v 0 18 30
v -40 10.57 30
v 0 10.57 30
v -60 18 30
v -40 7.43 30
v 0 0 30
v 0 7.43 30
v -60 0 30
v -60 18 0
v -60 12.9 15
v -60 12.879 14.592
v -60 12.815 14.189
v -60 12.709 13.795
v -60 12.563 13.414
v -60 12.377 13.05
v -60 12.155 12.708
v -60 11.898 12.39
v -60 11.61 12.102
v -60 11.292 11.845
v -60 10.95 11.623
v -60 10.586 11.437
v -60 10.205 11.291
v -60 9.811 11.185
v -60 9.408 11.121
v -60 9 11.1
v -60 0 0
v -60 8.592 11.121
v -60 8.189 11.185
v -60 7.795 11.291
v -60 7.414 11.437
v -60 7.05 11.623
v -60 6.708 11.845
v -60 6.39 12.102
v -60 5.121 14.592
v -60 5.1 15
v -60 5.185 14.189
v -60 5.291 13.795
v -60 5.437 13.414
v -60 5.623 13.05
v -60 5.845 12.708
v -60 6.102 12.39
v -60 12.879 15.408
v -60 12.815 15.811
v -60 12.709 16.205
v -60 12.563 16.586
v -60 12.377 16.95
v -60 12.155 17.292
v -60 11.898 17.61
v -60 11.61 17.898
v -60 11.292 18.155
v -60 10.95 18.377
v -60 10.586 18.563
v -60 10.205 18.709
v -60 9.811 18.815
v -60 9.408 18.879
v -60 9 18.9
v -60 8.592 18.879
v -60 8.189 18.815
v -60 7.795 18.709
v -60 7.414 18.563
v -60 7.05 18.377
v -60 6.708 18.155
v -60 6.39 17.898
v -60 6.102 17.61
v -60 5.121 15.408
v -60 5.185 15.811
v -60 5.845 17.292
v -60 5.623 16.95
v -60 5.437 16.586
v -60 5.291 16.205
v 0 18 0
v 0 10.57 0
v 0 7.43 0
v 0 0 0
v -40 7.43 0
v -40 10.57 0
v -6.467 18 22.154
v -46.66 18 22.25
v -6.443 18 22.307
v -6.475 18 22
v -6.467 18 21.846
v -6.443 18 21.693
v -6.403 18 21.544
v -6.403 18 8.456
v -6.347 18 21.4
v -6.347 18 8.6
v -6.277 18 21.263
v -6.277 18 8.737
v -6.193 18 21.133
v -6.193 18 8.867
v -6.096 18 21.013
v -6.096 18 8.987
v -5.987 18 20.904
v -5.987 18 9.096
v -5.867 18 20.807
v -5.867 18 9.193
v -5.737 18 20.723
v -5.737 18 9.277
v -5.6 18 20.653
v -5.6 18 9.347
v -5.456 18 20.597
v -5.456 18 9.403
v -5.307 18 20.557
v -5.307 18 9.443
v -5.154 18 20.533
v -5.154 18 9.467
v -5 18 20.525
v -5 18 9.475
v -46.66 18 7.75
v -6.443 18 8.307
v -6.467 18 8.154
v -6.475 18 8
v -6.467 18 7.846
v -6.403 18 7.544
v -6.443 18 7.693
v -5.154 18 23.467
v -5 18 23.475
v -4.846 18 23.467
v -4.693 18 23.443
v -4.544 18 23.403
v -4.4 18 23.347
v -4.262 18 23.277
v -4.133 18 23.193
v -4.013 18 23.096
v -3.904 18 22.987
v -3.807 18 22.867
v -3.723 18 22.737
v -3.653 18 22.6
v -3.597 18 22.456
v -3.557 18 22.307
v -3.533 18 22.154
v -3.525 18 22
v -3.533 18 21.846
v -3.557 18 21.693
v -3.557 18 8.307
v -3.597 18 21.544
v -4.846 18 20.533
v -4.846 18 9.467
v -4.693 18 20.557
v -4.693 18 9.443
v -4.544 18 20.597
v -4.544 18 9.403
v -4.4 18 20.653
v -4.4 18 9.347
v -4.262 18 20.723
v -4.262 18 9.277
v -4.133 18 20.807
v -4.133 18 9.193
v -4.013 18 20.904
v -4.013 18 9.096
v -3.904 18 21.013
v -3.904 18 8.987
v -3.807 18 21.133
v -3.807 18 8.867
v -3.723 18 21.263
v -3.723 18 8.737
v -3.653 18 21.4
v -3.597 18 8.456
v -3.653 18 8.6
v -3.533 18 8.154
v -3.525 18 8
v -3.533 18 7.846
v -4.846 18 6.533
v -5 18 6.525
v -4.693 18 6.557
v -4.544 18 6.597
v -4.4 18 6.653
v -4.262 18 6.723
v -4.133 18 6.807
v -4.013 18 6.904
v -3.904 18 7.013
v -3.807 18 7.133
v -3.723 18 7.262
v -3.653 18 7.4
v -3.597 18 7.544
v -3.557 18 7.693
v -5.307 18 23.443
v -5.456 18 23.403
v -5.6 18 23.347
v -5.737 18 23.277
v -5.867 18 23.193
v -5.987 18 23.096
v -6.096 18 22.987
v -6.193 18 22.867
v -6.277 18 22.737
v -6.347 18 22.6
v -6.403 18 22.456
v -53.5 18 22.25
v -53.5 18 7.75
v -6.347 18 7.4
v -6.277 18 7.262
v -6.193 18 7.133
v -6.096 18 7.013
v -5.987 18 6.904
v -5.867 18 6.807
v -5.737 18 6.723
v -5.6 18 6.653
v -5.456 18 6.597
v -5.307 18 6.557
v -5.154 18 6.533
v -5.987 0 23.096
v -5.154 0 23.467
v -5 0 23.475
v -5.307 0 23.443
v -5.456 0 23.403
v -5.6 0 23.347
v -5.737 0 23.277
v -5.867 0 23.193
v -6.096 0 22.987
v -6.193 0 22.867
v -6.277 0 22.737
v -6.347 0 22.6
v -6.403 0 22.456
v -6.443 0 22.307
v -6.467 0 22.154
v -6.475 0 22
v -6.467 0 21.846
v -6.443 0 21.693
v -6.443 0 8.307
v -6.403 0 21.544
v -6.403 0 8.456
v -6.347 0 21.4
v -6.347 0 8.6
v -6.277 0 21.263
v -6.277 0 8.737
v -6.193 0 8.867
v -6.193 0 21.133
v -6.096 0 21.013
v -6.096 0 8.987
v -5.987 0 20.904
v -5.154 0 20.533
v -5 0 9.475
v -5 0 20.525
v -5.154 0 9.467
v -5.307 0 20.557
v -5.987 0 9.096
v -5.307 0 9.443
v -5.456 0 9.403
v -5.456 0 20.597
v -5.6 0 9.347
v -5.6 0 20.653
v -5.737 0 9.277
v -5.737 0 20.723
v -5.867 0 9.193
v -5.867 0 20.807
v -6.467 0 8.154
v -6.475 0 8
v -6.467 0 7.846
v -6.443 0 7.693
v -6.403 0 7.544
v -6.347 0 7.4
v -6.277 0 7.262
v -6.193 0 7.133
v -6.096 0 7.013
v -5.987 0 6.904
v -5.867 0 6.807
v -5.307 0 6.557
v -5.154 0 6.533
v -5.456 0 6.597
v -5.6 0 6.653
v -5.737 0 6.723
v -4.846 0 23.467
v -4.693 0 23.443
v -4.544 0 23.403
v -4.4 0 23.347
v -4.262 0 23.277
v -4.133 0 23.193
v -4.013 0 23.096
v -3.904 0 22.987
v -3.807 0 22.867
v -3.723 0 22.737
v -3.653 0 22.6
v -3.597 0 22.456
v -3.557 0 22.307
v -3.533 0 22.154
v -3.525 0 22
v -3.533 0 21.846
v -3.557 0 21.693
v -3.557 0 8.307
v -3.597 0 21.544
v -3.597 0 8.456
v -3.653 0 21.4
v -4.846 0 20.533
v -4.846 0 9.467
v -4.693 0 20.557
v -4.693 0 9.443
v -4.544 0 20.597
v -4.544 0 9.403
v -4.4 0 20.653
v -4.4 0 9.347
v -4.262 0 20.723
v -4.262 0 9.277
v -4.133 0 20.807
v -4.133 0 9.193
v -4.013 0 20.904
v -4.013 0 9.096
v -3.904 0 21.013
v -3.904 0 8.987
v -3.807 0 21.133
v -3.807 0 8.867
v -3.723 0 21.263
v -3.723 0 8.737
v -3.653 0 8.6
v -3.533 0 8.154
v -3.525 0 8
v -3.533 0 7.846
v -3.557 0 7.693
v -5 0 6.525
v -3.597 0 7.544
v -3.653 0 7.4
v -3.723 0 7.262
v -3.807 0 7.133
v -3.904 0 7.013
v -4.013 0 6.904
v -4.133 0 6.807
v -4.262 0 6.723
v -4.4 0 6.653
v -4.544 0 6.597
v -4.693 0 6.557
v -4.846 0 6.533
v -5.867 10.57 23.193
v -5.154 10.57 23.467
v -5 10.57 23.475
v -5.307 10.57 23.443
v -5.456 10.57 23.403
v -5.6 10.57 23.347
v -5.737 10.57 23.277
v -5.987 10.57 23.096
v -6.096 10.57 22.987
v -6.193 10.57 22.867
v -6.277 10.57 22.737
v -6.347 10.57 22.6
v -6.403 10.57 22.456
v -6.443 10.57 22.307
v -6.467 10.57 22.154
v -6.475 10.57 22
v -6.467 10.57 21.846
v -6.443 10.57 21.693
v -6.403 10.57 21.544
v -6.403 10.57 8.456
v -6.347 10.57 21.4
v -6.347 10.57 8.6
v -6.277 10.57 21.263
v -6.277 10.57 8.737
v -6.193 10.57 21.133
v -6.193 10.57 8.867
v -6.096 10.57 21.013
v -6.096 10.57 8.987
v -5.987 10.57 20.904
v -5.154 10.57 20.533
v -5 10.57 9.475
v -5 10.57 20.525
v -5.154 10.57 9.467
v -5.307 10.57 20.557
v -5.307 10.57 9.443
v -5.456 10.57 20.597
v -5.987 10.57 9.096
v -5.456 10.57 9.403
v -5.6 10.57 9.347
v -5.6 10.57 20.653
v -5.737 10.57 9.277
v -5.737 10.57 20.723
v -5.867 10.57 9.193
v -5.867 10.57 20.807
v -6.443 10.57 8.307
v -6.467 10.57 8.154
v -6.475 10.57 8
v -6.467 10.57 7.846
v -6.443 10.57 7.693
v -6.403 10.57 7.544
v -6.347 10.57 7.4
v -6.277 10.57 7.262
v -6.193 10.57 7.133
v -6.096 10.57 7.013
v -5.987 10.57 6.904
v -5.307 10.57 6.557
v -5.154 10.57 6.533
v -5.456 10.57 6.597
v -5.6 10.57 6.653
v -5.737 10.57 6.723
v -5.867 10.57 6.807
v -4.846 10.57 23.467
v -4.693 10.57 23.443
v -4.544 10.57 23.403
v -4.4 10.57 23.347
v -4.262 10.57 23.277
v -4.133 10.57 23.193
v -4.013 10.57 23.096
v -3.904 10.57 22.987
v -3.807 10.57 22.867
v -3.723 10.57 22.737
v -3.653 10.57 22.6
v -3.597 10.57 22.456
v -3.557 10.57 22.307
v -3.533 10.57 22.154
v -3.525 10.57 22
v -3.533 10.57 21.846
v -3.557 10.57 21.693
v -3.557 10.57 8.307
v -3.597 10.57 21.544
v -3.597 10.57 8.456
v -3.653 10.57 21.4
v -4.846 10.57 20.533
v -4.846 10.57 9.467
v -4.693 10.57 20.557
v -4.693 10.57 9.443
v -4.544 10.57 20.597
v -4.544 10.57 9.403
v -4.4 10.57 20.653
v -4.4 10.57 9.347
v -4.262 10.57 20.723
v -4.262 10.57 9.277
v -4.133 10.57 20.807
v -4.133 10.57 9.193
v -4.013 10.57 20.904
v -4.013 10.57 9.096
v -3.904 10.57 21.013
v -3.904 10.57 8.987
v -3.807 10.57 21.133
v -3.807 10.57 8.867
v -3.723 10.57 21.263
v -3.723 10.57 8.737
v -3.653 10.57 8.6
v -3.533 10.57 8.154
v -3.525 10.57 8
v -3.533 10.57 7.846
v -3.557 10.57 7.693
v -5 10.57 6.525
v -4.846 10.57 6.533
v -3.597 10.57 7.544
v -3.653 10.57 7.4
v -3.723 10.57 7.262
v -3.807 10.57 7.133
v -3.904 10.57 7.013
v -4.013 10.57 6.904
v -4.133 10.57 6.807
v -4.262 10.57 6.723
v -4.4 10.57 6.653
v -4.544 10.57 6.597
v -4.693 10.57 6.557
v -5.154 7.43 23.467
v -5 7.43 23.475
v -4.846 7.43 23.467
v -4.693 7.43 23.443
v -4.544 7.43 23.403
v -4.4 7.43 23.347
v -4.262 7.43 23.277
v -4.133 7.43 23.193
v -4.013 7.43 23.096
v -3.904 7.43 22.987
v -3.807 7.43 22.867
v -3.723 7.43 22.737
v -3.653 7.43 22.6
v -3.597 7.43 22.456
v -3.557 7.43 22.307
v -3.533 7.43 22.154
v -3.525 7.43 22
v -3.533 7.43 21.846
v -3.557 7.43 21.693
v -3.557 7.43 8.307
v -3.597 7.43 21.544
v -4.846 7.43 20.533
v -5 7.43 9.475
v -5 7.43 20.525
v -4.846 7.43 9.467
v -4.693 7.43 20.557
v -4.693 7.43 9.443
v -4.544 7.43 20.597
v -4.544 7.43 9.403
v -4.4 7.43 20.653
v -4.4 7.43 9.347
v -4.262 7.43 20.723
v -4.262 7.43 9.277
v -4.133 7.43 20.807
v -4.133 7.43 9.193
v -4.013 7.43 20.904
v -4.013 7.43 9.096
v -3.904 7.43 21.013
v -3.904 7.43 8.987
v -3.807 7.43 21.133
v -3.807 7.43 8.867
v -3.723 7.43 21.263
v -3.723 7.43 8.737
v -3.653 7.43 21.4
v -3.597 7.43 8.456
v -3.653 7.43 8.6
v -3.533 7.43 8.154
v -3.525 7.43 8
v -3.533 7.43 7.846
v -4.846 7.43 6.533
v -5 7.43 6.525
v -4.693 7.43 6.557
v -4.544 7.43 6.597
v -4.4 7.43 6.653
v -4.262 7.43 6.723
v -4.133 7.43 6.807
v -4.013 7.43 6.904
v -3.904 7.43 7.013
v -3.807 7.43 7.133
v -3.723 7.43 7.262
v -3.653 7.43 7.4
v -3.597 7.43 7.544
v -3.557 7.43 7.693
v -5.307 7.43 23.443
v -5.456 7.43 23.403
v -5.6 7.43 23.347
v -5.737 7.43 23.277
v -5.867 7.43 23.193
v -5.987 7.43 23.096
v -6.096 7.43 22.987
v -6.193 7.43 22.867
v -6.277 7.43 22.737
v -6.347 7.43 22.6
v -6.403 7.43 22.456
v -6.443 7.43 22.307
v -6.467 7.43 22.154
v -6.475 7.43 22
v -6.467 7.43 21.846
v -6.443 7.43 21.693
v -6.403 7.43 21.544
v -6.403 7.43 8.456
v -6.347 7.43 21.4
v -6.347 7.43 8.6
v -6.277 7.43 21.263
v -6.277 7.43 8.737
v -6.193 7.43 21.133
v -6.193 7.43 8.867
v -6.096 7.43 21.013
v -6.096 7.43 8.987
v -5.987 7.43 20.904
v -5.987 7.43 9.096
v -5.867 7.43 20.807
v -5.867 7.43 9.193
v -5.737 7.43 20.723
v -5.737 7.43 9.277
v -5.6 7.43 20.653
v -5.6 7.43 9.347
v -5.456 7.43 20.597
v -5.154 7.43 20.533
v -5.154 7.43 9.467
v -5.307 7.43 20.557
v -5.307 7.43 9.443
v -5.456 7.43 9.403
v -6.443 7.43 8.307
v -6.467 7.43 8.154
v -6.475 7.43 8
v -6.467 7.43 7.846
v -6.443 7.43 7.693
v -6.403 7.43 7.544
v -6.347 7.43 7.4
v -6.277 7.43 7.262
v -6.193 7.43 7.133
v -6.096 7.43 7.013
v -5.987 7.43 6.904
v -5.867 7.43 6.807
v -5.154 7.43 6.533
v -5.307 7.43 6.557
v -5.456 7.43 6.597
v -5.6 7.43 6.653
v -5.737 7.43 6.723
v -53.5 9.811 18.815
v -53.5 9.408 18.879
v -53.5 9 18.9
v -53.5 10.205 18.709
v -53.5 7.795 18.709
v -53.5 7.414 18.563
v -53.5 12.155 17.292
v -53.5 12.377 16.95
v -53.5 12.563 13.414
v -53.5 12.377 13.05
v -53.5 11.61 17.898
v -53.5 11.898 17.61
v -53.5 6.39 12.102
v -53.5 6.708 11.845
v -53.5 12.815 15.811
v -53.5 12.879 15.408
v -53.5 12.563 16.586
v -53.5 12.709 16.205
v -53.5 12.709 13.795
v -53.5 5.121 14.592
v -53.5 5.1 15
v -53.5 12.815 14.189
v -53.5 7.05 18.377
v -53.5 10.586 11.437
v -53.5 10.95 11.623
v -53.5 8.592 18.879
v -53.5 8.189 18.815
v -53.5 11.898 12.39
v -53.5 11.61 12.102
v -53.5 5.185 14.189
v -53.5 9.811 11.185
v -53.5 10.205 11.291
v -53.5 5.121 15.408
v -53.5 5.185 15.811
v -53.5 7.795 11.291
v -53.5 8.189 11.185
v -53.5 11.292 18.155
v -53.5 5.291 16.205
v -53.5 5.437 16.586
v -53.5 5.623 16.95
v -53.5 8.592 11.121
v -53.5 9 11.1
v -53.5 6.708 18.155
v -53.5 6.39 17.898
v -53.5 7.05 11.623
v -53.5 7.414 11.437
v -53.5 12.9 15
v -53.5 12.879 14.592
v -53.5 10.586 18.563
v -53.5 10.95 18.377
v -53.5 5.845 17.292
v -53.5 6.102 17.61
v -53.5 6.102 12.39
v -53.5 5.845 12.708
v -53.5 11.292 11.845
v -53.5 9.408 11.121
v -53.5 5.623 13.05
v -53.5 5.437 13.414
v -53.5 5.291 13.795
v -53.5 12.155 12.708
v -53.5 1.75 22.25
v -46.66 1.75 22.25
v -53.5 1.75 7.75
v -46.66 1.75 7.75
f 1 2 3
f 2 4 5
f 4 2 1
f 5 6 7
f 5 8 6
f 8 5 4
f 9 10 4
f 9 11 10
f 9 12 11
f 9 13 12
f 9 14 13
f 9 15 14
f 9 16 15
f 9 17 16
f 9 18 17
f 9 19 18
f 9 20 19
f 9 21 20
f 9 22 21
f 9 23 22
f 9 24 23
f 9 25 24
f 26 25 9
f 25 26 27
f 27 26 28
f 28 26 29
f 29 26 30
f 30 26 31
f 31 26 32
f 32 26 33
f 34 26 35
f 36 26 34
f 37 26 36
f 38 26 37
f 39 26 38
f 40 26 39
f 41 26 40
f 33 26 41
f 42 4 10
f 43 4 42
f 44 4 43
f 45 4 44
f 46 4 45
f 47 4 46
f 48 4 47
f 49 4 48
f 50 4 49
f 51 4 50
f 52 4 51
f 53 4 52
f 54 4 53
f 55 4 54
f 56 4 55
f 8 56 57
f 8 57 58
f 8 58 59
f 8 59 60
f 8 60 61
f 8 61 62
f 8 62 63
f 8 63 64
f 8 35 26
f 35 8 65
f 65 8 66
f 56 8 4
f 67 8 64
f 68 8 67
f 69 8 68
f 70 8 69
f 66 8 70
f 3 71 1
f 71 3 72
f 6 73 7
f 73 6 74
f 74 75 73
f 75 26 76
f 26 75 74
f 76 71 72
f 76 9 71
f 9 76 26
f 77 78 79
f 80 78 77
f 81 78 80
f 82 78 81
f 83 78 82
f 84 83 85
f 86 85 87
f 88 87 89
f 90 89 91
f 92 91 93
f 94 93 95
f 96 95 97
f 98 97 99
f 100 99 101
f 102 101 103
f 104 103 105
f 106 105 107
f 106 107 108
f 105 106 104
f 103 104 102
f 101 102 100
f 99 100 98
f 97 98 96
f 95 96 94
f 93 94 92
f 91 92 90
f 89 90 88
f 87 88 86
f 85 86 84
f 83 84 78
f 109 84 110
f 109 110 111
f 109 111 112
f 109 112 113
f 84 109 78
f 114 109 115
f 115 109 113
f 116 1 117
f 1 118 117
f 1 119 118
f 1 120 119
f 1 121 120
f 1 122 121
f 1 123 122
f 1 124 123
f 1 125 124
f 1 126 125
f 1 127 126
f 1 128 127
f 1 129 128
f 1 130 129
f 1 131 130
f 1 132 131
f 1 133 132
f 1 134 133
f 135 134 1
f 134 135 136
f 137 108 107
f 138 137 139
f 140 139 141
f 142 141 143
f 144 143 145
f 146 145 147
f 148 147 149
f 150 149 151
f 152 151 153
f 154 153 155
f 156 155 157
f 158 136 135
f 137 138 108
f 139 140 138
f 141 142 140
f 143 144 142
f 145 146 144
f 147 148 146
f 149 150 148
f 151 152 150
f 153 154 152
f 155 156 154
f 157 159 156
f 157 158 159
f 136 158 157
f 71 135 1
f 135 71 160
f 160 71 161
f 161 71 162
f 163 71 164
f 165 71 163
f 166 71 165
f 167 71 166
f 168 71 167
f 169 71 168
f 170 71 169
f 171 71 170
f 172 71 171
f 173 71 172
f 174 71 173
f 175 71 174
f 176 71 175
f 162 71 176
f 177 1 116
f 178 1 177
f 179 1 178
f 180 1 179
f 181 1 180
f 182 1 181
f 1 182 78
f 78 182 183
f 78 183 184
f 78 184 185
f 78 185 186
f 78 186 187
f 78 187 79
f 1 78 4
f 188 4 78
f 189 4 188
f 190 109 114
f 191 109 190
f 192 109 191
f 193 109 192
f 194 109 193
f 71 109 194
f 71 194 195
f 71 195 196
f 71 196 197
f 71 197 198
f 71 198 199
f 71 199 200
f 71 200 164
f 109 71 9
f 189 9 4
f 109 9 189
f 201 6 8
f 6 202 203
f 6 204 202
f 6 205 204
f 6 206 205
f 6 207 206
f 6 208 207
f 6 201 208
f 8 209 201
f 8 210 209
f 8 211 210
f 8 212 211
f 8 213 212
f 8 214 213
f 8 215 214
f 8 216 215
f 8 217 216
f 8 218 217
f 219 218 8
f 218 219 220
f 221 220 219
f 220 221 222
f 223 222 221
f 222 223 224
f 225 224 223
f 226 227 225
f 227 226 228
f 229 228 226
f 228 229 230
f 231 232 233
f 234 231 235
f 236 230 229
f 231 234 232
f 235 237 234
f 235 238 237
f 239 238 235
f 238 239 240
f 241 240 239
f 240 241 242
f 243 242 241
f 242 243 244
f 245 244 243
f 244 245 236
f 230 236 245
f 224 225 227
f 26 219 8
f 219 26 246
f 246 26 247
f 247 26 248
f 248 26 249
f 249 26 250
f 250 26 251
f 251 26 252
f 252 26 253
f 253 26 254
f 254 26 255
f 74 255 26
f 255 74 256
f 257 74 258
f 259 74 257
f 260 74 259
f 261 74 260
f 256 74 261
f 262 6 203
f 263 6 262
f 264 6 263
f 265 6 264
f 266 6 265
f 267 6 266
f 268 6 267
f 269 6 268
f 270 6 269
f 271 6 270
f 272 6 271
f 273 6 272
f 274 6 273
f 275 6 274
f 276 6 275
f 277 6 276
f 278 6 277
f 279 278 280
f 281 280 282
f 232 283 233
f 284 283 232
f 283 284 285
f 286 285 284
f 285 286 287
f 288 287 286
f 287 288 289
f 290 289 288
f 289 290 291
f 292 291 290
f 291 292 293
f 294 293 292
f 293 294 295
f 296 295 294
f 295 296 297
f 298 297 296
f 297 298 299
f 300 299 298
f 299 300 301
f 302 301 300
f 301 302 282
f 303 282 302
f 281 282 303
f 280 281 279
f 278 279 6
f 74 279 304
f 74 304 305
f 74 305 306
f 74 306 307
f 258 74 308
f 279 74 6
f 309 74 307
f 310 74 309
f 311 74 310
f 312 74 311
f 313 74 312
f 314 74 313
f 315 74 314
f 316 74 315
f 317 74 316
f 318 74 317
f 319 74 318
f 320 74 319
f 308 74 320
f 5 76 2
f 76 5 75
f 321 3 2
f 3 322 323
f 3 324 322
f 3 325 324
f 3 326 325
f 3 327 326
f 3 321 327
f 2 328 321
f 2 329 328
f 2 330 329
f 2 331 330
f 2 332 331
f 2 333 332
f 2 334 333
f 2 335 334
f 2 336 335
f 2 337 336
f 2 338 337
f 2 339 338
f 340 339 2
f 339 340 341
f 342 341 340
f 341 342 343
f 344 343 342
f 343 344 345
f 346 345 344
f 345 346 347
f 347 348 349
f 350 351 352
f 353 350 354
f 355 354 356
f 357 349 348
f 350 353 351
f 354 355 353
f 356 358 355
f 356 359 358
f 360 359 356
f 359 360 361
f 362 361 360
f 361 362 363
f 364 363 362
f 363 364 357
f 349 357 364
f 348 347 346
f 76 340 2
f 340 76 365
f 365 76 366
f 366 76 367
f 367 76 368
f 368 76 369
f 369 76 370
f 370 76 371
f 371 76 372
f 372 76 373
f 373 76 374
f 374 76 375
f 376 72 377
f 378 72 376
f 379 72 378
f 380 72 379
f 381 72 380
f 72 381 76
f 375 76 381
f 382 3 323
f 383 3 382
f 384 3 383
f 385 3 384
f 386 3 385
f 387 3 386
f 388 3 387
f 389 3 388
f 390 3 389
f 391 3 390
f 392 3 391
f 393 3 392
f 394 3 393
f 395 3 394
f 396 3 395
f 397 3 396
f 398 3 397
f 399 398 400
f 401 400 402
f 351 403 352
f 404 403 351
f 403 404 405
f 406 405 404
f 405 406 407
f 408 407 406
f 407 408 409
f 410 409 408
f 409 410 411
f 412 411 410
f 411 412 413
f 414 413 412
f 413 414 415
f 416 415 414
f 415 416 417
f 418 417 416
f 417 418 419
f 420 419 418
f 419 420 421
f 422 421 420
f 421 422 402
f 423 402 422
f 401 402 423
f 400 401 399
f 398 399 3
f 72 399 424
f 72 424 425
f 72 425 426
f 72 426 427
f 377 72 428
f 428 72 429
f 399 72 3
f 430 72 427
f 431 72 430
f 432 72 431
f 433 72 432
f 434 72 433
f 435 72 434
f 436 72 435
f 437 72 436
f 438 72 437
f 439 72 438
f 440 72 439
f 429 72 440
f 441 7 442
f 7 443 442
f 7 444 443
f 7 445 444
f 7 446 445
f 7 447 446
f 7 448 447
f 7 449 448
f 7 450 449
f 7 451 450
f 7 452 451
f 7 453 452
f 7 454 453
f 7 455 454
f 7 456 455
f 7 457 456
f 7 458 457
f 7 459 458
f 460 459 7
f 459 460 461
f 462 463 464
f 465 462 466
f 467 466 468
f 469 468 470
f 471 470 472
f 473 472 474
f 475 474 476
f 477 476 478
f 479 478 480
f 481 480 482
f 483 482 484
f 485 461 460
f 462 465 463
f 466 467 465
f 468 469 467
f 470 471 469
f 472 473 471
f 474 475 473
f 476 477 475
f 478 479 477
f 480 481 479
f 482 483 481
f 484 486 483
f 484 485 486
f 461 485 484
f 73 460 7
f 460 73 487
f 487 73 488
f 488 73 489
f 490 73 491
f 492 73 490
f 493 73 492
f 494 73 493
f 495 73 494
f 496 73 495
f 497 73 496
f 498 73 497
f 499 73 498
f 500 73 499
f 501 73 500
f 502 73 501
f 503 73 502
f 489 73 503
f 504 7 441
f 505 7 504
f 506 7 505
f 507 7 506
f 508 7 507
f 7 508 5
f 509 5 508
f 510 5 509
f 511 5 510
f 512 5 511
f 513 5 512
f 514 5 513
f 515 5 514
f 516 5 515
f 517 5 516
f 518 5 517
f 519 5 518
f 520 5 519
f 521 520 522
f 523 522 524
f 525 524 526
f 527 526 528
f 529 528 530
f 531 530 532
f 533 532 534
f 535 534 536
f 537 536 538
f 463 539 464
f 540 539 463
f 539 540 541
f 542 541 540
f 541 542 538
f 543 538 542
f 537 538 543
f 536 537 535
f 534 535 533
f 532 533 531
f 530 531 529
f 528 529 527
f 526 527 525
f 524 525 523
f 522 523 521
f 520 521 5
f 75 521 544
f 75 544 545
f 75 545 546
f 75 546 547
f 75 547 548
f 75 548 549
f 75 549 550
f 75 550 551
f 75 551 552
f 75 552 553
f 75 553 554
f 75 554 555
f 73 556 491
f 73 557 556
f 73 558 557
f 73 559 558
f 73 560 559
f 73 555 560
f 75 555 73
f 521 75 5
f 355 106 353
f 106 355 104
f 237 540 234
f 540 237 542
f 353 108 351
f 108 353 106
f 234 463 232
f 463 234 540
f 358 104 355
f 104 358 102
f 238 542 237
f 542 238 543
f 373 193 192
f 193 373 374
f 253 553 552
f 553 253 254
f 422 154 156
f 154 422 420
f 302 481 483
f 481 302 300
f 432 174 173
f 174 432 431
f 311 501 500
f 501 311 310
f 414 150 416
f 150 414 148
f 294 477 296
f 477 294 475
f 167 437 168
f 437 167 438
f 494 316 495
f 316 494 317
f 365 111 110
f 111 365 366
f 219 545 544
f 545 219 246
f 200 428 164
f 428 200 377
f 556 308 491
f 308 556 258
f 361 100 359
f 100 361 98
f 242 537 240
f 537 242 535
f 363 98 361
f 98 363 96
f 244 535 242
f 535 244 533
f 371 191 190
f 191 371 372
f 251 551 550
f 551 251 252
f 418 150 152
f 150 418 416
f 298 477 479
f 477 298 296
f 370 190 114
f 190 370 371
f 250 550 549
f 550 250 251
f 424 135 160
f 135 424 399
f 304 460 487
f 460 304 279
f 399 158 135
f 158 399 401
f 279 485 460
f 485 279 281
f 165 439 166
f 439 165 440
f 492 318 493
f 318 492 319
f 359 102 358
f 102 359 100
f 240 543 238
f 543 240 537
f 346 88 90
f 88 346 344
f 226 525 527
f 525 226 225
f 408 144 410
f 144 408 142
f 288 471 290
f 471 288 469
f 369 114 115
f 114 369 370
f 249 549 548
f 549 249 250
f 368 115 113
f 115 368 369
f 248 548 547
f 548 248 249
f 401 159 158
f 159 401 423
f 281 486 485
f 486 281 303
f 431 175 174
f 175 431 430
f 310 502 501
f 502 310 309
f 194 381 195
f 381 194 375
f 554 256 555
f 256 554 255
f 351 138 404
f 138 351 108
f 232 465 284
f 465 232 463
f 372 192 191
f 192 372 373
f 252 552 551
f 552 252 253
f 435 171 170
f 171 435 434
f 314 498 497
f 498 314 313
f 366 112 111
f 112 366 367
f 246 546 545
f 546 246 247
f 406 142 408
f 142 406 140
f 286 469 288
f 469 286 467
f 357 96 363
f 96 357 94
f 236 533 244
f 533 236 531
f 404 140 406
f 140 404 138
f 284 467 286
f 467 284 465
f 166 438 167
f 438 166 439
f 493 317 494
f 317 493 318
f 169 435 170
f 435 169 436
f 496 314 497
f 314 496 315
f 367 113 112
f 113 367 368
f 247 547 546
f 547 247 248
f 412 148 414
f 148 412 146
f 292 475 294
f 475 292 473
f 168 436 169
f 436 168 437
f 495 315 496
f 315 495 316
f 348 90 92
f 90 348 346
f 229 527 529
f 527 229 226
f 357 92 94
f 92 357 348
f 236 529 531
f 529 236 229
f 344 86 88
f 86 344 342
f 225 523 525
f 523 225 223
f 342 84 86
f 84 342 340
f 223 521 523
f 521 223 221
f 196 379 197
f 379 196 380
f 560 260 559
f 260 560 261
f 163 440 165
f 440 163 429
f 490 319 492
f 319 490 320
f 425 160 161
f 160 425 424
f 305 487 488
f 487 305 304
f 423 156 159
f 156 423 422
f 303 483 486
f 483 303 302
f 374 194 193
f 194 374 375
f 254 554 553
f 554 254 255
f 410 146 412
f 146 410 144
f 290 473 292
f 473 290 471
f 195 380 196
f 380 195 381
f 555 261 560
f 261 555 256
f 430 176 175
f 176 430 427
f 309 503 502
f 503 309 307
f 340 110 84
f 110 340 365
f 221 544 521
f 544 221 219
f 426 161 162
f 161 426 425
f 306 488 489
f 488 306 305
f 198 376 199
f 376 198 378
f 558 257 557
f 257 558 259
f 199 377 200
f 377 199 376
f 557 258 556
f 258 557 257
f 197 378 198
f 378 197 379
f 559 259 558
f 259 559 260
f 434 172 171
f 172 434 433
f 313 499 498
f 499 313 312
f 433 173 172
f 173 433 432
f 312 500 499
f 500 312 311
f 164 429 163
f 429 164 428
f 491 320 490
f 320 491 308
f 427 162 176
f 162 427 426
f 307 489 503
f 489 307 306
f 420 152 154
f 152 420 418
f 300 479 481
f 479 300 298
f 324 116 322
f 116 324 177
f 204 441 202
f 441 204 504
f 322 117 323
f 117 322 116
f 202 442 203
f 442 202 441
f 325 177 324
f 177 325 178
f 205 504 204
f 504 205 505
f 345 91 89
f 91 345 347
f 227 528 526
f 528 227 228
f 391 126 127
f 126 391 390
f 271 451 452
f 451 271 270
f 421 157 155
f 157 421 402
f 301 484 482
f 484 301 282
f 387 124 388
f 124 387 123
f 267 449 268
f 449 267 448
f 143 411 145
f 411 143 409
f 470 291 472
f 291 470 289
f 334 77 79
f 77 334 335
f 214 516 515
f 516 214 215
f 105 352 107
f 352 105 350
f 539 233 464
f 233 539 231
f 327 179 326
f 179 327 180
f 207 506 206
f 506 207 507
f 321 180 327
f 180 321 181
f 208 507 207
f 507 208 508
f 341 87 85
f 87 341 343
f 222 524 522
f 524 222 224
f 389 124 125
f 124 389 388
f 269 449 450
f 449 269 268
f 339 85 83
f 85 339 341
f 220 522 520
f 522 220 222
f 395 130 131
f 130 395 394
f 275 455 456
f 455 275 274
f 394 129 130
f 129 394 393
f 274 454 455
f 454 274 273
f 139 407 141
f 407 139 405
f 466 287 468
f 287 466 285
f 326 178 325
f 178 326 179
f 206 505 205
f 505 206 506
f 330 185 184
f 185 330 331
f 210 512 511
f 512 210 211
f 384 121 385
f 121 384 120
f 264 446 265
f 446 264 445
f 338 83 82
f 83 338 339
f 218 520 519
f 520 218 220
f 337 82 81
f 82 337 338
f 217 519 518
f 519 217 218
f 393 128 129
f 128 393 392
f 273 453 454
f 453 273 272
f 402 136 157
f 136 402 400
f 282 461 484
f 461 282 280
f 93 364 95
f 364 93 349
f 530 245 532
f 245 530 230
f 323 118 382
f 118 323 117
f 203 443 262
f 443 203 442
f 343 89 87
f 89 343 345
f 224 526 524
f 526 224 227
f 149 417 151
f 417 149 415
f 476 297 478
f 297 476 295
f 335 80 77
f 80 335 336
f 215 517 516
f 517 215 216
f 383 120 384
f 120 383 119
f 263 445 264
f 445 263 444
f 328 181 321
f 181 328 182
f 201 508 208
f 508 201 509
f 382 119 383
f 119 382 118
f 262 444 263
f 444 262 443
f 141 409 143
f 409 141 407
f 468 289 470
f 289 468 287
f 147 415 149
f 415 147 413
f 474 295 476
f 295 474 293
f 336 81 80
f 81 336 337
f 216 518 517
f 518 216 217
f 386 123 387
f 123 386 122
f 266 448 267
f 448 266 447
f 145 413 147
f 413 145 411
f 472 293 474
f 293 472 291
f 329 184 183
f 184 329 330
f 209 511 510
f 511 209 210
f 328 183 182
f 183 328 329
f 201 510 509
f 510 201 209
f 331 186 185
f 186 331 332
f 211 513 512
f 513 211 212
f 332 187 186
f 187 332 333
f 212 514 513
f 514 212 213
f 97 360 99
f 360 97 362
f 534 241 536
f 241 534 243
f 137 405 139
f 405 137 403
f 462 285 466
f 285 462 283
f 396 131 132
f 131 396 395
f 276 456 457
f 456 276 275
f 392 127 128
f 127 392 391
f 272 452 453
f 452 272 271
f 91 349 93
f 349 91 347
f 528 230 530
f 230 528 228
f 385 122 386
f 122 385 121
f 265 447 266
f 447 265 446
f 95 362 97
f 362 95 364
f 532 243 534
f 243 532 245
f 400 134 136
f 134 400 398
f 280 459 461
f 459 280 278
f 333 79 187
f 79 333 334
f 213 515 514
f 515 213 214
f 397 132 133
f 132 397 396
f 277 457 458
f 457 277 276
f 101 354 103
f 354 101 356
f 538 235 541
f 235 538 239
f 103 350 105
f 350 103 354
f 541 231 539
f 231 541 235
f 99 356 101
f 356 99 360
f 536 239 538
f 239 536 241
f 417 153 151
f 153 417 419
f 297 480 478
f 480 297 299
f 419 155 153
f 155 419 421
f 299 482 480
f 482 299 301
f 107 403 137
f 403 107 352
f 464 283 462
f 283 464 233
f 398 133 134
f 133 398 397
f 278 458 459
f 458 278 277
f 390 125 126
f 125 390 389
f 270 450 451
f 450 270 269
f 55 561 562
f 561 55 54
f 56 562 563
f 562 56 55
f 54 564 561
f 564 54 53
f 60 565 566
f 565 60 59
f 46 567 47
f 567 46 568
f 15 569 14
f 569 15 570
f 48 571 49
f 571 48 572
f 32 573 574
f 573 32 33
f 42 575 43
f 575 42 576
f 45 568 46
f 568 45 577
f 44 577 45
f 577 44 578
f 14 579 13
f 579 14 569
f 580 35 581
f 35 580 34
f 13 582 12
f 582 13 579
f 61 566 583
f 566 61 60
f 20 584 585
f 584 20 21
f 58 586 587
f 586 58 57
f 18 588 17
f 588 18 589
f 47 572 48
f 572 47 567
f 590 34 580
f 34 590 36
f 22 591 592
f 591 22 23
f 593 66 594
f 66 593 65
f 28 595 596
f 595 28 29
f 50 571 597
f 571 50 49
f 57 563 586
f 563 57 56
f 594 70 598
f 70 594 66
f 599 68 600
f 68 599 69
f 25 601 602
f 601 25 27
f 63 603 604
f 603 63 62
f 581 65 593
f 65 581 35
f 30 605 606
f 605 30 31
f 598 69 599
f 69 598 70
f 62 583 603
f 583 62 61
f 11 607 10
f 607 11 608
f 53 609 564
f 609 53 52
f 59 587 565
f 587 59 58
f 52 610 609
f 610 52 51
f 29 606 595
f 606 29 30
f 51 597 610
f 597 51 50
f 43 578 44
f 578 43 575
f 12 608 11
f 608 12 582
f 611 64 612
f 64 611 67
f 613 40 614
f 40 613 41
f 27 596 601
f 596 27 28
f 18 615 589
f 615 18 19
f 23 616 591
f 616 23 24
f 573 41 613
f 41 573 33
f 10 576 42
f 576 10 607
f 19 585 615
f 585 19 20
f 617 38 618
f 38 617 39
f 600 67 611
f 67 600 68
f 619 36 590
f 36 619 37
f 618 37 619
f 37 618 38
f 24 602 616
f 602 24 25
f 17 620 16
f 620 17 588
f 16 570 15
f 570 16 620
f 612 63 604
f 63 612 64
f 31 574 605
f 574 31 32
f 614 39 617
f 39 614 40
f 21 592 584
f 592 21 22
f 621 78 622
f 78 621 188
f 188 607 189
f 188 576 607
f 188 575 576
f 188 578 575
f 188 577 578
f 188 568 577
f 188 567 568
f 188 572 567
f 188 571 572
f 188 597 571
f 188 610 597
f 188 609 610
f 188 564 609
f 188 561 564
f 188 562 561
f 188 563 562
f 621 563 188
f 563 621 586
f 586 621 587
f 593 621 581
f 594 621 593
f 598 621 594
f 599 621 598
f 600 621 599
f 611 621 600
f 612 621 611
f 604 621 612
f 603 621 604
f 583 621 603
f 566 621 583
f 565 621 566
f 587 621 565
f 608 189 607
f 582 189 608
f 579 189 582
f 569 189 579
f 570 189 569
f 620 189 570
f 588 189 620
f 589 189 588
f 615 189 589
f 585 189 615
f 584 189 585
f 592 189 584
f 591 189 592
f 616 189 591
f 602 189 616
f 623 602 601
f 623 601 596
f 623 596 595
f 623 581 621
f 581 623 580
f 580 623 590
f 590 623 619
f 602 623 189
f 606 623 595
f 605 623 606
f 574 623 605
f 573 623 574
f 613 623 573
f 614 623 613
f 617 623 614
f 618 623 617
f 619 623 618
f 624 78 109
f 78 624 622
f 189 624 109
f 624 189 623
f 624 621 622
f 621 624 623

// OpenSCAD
// file: ../inc/frame_mount_connector.scad
module frame_mount_connector_hole(w, l) {
    cylinder(r=2, h=20); 
}

module frame_mount_connector_edge(w, l) {
    difference() {
        rotate([45, 0, 0]) rotate([0, 90, 0])
            difference() {
                cube([w, w, l]);
                rotate([0, 0, 45])
                    cube([w*2, w*2, l]);
            }
         translate([0, w/4.5, -w-3]) rotate([90, 0, 90])
            cube([w, w, l+1]);
    }

}


//frame_mount_connector_edge(10, 30);
// file: ../frame_mount_holder.scad
include <inc/common.scad>
use <inc/frame_mount_connector.scad>


plate_holder_thickness = 11;



module plate_holder(mount_height, has_nut_hole) {
        difference() {
            cube([30, plate_holder_thickness, mount_height]);
            translate([0, (plate_holder_thickness-frame_thickness)/2, 0])
                cube([30, frame_thickness, mount_height-10]);
            if (has_nut_hole)
                translate([8, 0, 5])
                    horizontal_m3_hole();
            if (has_nut_hole)
                translate([22, 0, 5])
                    horizontal_m3_hole();
 
        }
}

//rotate([180, 0, 0])
difference() {
    union() {
        plate_holder(60, true);
        translate([0, -1.7, 70])
            frame_mount_connector_edge(10, 30);
    }
    // xy slot
    translate([30/2, (plate_holder_thickness)/2, 64])
        frame_mount_connector_hole();
}
// file: ../inc/common.scad
m8_r = 3.9;
m8_nut_outer_d = 14.5;
m8_nut_h = 6.34;

module m8_rod(l) {
    rotate([-90, 0, 0])
        cylinder(r=m8_r, h=l);
}

bearing_608zz_h = 6.94;
bearing_608zz_d = 22;
bearing_608zz_r = bearing_608zz_d/2;

frame_thickness = 3.14;

module m3_hole(l) {
    m3_r = 1.475;
    cylinder(r=m3_r, h=l);
}

module horizontal_m3_hole() {
    translate([0, 60, 0])
        rotate([90, 0, 0])
            m3_hole(70);
}
// main file
include <../inc/common.scad>
use <../frame_mount_holder.scad>

$fn = 60;
plate_holder_thickness = 18.;

module m8_plate_holder(mount_height, has_nut_hole) {
        difference() {
            cube([30, plate_holder_thickness, mount_height]);
            translate([0, (plate_holder_thickness-frame_thickness)/2, 0])
                cube([30, frame_thickness, mount_height-20]);
            if (has_nut_hole)
                translate([8, 0, 5])
                    horizontal_m3_hole();
            if (has_nut_hole)
                translate([22, 0, 5])
                    horizontal_m3_hole();
            translate([15, plate_holder_thickness/2, mount_height-11])
                cylinder(r=m8_r, h=11);
            translate([(30-m8_nut_outer_d)/2,
                      (plate_holder_thickness-m8_nut_outer_d)/2,
                      mount_height-10+3-m8_nut_h]) 
                cube([m8_nut_outer_d, m8_nut_outer_d+10, m8_nut_h+0.5]);
 
        }
}

rotate([0, -90, 0])
m8_plate_holder(60, true);
